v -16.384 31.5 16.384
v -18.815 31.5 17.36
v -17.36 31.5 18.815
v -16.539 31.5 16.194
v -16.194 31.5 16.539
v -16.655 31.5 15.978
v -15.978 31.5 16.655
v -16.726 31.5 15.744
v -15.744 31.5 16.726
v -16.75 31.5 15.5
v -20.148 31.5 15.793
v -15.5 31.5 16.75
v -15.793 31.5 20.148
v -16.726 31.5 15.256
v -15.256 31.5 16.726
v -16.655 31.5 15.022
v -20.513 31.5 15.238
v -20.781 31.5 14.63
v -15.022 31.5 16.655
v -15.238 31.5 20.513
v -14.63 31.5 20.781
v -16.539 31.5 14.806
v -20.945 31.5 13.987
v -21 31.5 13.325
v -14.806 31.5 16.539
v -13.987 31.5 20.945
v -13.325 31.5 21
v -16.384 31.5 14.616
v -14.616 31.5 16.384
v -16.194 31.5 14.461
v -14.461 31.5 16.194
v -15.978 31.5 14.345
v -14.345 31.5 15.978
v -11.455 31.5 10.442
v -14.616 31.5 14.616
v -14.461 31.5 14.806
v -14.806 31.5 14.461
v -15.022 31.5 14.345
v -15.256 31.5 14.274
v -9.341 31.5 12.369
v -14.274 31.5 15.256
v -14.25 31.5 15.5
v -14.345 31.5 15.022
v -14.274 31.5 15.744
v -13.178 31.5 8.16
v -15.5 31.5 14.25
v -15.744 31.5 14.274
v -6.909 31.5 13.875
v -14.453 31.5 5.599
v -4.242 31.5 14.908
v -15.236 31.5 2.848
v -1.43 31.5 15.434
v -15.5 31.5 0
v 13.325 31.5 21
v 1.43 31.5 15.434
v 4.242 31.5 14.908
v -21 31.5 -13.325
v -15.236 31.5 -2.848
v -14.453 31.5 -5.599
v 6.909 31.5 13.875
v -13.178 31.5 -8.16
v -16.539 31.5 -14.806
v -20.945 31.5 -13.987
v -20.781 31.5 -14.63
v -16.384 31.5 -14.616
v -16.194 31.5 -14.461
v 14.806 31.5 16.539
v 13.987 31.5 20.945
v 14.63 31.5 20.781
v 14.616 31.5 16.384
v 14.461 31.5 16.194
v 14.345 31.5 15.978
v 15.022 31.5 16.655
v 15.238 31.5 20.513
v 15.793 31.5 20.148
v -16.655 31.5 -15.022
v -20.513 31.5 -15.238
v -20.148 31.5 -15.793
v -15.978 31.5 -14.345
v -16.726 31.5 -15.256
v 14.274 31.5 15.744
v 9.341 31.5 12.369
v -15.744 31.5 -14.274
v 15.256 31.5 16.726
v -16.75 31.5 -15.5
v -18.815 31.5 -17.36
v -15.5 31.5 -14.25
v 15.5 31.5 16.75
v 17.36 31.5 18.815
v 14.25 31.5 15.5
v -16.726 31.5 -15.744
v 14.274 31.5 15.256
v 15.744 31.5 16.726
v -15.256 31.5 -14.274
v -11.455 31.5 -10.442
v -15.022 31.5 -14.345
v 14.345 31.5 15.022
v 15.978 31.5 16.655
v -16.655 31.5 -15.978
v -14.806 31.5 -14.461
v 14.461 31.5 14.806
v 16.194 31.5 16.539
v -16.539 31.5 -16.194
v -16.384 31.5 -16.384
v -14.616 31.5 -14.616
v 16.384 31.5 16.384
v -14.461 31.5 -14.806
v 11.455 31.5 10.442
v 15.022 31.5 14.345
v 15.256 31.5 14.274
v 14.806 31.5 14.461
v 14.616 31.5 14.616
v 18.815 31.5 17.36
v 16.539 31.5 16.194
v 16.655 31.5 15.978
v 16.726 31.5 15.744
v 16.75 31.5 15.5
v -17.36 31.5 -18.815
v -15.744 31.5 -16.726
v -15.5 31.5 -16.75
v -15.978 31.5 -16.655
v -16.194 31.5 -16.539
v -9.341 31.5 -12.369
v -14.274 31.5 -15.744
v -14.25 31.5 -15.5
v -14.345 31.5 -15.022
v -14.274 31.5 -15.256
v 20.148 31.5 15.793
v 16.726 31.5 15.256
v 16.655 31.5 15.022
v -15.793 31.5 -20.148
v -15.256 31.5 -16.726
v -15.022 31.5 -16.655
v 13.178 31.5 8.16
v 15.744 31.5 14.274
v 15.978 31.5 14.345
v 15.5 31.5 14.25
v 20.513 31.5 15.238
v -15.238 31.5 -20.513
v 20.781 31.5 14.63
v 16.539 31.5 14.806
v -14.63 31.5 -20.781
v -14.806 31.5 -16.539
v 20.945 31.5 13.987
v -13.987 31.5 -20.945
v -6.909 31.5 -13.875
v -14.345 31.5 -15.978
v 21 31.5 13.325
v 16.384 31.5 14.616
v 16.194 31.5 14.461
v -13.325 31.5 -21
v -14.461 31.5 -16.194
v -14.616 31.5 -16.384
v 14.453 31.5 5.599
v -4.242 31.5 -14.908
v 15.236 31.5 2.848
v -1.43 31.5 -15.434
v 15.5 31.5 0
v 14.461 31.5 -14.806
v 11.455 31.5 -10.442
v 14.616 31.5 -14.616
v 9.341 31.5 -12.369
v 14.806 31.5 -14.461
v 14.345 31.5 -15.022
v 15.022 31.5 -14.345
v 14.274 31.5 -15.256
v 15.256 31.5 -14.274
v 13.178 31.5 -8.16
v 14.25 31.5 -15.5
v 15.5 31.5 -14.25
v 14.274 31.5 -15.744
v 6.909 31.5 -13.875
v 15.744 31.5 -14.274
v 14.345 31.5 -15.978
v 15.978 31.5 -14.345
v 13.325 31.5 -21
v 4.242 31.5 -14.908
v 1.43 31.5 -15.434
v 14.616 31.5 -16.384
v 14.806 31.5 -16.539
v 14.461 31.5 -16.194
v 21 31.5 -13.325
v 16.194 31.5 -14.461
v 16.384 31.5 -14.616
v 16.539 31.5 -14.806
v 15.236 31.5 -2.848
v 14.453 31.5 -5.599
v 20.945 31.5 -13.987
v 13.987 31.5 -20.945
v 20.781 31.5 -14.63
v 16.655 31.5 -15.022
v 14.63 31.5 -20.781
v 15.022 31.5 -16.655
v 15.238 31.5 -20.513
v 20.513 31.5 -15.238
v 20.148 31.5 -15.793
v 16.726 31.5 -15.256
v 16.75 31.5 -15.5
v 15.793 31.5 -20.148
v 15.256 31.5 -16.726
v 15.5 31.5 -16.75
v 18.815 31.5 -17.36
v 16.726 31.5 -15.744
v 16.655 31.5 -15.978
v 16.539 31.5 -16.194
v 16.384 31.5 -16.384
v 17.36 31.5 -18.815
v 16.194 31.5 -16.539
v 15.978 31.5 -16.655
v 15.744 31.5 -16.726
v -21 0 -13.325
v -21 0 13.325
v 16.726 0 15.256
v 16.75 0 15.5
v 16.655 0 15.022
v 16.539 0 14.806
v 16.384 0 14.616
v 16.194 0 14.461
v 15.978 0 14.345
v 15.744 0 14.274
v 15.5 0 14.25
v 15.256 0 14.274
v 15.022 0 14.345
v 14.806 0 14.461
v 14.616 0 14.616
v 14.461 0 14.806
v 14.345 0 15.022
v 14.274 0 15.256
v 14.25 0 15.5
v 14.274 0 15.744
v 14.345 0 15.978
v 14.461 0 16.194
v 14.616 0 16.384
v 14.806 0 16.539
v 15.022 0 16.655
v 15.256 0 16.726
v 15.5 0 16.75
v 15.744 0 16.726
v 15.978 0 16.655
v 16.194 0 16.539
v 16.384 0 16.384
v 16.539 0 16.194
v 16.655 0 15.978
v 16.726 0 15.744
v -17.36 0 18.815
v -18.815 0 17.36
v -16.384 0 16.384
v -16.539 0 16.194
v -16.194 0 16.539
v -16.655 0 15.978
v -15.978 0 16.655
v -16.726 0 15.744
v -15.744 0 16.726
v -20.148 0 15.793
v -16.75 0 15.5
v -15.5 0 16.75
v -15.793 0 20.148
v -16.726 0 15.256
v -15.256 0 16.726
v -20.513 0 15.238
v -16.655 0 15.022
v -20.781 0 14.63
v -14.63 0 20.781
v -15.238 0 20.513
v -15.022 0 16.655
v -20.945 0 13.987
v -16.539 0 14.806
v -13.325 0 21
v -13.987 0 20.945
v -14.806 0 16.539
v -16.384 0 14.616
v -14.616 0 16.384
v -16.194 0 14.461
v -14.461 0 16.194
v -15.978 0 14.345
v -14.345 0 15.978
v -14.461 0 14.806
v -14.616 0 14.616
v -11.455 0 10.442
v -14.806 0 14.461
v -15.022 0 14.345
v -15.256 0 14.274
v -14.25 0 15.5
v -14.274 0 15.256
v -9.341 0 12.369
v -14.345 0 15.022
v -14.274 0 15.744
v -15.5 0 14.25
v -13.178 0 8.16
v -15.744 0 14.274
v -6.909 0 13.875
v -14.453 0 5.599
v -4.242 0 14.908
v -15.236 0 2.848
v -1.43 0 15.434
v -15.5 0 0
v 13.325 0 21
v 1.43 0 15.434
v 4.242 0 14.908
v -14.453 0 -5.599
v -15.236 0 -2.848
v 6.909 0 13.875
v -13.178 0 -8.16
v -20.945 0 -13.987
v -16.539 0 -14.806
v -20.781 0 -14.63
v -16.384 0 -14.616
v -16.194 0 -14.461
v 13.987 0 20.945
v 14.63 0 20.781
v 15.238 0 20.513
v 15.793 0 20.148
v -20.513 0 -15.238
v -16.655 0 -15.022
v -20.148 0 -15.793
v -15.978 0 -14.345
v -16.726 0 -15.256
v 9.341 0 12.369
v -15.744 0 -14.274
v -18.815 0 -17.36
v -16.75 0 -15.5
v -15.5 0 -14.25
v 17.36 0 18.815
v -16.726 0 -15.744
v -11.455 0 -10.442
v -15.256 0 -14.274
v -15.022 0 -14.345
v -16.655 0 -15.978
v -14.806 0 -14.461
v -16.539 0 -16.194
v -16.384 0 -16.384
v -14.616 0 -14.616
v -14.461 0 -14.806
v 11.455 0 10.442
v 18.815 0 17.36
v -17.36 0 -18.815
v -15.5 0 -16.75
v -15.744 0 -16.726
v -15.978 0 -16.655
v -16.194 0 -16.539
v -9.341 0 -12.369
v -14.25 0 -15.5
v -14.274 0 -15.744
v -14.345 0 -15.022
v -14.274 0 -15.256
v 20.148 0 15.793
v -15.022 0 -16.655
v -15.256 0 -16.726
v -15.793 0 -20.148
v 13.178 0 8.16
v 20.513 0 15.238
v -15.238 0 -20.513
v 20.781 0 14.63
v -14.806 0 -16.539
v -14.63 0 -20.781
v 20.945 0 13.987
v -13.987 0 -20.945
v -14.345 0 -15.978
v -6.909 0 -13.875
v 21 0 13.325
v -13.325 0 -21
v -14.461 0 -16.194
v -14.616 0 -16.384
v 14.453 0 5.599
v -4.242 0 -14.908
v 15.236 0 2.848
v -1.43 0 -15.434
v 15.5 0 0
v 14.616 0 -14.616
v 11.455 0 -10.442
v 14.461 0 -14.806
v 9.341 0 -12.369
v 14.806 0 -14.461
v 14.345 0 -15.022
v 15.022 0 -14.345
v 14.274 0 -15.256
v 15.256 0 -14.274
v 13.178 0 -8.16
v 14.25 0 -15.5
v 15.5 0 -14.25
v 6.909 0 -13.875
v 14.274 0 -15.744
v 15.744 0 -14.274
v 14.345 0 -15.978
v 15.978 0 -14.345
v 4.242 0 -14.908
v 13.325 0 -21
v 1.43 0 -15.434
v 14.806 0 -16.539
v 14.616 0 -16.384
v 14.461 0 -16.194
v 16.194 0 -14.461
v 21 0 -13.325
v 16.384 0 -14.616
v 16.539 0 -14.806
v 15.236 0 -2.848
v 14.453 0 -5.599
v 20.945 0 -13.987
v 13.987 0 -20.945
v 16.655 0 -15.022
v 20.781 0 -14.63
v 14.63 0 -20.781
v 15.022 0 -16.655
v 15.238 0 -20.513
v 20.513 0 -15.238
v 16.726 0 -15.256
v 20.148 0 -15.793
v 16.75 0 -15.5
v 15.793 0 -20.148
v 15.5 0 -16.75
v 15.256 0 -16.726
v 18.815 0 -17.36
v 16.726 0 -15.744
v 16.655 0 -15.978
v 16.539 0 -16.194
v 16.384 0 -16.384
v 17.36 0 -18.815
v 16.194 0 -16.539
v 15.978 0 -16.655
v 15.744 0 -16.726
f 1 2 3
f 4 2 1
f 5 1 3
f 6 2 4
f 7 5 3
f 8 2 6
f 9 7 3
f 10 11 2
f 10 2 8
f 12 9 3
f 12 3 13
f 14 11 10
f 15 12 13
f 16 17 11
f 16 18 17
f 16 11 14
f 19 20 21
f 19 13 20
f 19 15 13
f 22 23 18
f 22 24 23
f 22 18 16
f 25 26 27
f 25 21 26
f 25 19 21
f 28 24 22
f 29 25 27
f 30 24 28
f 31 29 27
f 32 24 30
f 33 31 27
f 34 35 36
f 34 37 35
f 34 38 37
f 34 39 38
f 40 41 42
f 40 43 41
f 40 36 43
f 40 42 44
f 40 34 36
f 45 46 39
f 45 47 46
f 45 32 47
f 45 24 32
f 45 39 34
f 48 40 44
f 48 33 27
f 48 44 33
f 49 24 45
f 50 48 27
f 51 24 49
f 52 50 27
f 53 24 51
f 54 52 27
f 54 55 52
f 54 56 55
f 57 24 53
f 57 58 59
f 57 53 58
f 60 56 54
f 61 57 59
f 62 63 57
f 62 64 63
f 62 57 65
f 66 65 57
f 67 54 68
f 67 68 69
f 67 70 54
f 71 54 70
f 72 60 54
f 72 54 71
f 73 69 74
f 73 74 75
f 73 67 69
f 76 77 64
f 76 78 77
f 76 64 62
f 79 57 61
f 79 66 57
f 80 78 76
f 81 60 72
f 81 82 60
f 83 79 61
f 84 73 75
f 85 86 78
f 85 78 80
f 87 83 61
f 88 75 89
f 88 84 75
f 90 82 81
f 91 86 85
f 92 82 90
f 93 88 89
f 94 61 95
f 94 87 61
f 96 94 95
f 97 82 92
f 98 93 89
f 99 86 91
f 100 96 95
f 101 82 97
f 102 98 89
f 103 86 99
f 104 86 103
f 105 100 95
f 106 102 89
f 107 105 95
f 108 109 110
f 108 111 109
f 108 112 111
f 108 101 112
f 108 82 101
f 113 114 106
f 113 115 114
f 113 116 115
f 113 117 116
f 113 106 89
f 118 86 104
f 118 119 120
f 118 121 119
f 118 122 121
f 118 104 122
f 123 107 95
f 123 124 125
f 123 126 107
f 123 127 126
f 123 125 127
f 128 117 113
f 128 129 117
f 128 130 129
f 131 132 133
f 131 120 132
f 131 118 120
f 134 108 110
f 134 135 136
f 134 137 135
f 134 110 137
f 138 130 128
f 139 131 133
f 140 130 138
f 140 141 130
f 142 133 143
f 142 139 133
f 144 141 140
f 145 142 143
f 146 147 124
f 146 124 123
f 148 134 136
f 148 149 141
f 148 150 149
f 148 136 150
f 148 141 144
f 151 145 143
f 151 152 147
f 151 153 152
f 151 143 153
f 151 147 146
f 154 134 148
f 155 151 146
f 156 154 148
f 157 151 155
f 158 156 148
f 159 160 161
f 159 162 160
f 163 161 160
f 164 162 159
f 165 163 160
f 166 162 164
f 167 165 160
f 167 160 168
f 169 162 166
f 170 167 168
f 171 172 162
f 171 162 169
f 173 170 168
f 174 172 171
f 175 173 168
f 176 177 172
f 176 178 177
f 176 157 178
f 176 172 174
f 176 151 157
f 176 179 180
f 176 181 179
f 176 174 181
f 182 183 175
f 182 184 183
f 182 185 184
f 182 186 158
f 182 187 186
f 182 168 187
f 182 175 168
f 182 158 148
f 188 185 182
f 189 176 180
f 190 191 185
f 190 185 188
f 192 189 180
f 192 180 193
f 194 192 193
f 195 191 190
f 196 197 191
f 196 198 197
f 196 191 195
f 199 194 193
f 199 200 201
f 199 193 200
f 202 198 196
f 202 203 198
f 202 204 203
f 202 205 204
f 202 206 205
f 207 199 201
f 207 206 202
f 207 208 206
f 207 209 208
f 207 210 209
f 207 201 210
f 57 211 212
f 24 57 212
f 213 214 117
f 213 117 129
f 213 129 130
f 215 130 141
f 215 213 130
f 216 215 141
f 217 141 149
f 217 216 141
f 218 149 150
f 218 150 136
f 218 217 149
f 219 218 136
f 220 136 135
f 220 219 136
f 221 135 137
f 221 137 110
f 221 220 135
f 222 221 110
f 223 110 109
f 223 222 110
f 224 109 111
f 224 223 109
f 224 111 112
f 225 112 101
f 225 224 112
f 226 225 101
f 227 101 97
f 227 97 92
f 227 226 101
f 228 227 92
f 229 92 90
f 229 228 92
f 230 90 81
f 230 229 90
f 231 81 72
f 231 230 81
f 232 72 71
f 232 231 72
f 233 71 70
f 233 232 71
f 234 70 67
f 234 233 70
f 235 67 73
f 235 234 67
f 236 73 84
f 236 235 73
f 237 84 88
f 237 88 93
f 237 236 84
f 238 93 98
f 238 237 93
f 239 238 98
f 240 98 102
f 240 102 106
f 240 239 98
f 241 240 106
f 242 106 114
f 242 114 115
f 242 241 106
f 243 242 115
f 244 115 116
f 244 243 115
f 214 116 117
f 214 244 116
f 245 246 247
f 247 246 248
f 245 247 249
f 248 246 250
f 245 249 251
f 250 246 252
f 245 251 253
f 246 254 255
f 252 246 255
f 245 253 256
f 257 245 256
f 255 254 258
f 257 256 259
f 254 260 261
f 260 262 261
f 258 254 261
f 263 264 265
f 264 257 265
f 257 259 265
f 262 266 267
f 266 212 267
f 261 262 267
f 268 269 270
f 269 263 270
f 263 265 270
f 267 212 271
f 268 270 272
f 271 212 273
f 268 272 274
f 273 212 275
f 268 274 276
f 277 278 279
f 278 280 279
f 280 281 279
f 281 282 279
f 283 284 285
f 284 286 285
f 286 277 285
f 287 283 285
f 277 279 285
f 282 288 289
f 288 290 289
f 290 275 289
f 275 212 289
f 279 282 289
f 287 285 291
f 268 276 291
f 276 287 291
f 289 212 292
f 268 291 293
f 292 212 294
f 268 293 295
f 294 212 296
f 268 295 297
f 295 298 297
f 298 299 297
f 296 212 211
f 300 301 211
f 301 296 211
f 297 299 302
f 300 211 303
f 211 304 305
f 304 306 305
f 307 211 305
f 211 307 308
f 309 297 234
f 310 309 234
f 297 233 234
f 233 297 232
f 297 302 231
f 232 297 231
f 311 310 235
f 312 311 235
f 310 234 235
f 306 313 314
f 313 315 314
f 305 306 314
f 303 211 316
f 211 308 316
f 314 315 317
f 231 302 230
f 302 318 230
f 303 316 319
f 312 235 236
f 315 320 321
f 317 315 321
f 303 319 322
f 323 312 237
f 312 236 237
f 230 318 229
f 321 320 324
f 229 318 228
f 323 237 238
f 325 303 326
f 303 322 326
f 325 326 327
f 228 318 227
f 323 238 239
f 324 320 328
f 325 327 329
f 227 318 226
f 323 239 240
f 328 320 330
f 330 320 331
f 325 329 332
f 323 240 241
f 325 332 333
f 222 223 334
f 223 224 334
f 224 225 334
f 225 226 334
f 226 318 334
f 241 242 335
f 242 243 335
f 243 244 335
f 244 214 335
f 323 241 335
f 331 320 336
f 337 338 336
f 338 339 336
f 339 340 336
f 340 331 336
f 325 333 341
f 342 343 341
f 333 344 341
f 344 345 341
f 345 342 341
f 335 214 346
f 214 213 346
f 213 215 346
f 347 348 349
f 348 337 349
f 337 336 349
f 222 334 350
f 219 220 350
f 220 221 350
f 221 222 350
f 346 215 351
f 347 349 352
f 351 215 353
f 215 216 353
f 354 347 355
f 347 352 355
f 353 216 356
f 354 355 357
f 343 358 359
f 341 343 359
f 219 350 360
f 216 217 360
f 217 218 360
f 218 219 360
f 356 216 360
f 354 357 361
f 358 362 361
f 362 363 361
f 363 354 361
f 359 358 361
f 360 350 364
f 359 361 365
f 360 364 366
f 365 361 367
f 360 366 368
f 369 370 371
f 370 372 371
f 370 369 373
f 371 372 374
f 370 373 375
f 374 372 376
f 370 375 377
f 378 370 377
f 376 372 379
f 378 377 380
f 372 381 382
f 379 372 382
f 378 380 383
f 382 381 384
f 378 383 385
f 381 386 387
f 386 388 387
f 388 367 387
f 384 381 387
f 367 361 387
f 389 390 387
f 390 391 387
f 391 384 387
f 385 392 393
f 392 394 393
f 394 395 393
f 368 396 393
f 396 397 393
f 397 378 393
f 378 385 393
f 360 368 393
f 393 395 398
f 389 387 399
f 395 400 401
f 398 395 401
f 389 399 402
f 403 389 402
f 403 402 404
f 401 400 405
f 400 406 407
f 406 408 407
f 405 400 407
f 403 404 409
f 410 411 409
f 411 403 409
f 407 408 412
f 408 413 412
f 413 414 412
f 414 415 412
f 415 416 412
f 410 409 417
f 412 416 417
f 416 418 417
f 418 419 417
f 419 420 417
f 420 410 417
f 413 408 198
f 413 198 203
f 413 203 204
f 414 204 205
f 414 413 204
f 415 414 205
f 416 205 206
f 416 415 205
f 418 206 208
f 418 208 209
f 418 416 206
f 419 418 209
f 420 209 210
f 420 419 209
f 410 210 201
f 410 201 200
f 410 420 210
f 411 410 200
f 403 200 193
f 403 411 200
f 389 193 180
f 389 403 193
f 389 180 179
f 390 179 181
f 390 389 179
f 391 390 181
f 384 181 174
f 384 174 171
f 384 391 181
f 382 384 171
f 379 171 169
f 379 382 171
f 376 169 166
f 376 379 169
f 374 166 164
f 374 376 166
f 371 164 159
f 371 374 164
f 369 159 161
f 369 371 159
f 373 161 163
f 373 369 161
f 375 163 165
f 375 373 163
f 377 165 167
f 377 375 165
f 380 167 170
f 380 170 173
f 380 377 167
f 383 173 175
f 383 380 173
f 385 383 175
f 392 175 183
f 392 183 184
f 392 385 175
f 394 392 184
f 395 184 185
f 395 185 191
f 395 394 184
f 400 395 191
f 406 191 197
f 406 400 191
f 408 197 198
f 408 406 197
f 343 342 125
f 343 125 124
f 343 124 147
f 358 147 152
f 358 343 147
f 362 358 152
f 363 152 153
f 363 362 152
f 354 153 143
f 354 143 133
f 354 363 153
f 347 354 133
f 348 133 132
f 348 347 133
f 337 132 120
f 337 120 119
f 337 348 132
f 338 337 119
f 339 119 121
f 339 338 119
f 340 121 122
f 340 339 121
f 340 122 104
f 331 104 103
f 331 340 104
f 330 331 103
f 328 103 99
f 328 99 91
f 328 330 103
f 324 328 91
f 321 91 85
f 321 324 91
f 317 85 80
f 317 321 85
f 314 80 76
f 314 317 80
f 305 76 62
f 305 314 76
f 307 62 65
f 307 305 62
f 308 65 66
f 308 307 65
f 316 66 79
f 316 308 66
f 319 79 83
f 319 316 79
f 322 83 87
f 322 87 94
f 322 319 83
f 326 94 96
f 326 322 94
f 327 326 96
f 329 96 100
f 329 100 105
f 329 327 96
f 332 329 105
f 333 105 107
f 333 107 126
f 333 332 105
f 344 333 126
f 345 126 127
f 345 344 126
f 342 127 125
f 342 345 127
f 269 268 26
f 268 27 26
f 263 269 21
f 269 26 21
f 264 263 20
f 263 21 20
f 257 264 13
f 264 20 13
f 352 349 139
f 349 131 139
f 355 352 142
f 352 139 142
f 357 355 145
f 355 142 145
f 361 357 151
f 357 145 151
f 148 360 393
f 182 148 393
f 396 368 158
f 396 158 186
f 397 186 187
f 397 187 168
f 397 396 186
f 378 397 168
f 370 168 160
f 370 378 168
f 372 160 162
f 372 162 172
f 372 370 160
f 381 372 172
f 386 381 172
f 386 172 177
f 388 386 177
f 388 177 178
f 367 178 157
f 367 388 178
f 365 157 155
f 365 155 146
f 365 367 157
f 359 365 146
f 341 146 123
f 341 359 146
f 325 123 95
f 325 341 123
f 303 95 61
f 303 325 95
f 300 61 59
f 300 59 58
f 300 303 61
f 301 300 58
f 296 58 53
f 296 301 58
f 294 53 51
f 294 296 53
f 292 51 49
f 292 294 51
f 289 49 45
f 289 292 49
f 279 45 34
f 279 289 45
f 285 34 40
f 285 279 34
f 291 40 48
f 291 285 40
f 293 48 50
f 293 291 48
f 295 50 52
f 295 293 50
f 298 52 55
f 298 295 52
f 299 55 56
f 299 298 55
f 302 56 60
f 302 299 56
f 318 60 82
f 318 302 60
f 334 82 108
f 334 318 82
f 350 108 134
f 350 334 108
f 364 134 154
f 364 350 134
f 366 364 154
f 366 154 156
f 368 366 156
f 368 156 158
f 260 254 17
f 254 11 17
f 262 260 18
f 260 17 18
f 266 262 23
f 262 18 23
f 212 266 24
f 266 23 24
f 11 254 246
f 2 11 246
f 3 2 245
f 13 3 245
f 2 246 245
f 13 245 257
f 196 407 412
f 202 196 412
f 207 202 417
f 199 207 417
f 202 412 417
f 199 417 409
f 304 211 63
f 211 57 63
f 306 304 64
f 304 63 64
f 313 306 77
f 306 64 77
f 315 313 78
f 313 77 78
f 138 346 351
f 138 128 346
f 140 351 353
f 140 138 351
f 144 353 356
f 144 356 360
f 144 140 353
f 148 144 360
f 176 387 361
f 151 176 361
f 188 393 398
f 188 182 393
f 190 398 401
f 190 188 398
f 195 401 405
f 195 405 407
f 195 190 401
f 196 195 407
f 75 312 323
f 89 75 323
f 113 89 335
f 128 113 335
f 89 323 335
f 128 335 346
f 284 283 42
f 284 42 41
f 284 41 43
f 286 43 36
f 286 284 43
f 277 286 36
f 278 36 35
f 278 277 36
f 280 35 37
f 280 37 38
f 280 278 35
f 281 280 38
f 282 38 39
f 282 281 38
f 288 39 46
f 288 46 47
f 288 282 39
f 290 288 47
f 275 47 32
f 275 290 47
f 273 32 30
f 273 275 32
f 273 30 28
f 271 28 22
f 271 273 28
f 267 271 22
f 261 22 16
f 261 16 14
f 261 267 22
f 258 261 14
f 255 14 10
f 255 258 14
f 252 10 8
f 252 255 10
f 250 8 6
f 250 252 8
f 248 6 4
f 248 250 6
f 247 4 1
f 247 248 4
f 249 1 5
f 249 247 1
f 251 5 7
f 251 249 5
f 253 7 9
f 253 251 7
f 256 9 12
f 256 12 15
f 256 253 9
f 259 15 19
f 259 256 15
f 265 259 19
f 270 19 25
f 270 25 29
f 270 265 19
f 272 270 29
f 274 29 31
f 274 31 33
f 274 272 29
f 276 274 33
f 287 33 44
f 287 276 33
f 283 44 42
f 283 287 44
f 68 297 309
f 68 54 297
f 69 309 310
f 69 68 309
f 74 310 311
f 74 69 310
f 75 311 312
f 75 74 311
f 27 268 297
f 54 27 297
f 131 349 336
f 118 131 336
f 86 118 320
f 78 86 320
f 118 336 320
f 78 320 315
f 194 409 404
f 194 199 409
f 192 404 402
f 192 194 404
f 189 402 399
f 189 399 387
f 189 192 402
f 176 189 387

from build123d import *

# Parameters (mm, degrees)
SKETCH_1_R      = 1.25
SKETCH_1_R_2    = 15.5
EXTRUDE_1_DEPTH = 31.5
FILLET_1_R      = 4


with BuildPart() as part:
    # Эскиз1 → Бобышка-Вытянуть1 (new body)
    with BuildSketch(Plane(origin=(0, 0, 0), x_dir=(1, 0, 0), z_dir=(0, 1, 0))):
        with BuildLine():
            Line((-14.641038215, -21), (14.641038215, -21))
            ThreePointArc((14.641038215, -21), (18.101933598, -18.101933598), (21, -14.641038215))
            Line((21, -14.641038215), (21, 14.641038215))
            ThreePointArc((21, 14.641038215), (18.101933598, 18.101933598), (14.641038215, 21))
            Line((14.641038215, 21), (-14.641038215, 21))
            ThreePointArc((-14.641038215, 21), (-18.101933598, 18.101933598), (-21, 14.641038215))
            Line((-21, 14.641038215), (-21, -14.641038215))
            ThreePointArc((-21, -14.641038215), (-18.101933598, -18.101933598), (-14.641038215, -21))
        make_face()
        with Locations((-15.5, 15.5)):
            Circle(SKETCH_1_R, mode=Mode.SUBTRACT)
        with Locations((15.5, 15.5)):
            Circle(SKETCH_1_R, mode=Mode.SUBTRACT)
        with Locations((15.5, -15.5)):
            Circle(SKETCH_1_R, mode=Mode.SUBTRACT)
        with Locations((-15.5, -15.5)):
            Circle(SKETCH_1_R, mode=Mode.SUBTRACT)
        Circle(SKETCH_1_R_2, mode=Mode.SUBTRACT)
    extrude(amount=EXTRUDE_1_DEPTH)

    # Скругление1
    fillet_1_edges = [part.edges().sort_by_distance(p)[0] for p in [
        (21, 15.75, -14.641038215),
        (21, 15.75, 14.641038215),
        (14.641038215, 15.75, 21),
        (-14.641038215, 15.75, 21),
        (-21, 15.75, 14.641038215),
        (-21, 15.75, -14.641038215),
        (-14.641038215, 15.75, -21),
        (14.641038215, 15.75, -21),
    ]]
    fillet(fillet_1_edges, radius=FILLET_1_R)


solid = part.part
